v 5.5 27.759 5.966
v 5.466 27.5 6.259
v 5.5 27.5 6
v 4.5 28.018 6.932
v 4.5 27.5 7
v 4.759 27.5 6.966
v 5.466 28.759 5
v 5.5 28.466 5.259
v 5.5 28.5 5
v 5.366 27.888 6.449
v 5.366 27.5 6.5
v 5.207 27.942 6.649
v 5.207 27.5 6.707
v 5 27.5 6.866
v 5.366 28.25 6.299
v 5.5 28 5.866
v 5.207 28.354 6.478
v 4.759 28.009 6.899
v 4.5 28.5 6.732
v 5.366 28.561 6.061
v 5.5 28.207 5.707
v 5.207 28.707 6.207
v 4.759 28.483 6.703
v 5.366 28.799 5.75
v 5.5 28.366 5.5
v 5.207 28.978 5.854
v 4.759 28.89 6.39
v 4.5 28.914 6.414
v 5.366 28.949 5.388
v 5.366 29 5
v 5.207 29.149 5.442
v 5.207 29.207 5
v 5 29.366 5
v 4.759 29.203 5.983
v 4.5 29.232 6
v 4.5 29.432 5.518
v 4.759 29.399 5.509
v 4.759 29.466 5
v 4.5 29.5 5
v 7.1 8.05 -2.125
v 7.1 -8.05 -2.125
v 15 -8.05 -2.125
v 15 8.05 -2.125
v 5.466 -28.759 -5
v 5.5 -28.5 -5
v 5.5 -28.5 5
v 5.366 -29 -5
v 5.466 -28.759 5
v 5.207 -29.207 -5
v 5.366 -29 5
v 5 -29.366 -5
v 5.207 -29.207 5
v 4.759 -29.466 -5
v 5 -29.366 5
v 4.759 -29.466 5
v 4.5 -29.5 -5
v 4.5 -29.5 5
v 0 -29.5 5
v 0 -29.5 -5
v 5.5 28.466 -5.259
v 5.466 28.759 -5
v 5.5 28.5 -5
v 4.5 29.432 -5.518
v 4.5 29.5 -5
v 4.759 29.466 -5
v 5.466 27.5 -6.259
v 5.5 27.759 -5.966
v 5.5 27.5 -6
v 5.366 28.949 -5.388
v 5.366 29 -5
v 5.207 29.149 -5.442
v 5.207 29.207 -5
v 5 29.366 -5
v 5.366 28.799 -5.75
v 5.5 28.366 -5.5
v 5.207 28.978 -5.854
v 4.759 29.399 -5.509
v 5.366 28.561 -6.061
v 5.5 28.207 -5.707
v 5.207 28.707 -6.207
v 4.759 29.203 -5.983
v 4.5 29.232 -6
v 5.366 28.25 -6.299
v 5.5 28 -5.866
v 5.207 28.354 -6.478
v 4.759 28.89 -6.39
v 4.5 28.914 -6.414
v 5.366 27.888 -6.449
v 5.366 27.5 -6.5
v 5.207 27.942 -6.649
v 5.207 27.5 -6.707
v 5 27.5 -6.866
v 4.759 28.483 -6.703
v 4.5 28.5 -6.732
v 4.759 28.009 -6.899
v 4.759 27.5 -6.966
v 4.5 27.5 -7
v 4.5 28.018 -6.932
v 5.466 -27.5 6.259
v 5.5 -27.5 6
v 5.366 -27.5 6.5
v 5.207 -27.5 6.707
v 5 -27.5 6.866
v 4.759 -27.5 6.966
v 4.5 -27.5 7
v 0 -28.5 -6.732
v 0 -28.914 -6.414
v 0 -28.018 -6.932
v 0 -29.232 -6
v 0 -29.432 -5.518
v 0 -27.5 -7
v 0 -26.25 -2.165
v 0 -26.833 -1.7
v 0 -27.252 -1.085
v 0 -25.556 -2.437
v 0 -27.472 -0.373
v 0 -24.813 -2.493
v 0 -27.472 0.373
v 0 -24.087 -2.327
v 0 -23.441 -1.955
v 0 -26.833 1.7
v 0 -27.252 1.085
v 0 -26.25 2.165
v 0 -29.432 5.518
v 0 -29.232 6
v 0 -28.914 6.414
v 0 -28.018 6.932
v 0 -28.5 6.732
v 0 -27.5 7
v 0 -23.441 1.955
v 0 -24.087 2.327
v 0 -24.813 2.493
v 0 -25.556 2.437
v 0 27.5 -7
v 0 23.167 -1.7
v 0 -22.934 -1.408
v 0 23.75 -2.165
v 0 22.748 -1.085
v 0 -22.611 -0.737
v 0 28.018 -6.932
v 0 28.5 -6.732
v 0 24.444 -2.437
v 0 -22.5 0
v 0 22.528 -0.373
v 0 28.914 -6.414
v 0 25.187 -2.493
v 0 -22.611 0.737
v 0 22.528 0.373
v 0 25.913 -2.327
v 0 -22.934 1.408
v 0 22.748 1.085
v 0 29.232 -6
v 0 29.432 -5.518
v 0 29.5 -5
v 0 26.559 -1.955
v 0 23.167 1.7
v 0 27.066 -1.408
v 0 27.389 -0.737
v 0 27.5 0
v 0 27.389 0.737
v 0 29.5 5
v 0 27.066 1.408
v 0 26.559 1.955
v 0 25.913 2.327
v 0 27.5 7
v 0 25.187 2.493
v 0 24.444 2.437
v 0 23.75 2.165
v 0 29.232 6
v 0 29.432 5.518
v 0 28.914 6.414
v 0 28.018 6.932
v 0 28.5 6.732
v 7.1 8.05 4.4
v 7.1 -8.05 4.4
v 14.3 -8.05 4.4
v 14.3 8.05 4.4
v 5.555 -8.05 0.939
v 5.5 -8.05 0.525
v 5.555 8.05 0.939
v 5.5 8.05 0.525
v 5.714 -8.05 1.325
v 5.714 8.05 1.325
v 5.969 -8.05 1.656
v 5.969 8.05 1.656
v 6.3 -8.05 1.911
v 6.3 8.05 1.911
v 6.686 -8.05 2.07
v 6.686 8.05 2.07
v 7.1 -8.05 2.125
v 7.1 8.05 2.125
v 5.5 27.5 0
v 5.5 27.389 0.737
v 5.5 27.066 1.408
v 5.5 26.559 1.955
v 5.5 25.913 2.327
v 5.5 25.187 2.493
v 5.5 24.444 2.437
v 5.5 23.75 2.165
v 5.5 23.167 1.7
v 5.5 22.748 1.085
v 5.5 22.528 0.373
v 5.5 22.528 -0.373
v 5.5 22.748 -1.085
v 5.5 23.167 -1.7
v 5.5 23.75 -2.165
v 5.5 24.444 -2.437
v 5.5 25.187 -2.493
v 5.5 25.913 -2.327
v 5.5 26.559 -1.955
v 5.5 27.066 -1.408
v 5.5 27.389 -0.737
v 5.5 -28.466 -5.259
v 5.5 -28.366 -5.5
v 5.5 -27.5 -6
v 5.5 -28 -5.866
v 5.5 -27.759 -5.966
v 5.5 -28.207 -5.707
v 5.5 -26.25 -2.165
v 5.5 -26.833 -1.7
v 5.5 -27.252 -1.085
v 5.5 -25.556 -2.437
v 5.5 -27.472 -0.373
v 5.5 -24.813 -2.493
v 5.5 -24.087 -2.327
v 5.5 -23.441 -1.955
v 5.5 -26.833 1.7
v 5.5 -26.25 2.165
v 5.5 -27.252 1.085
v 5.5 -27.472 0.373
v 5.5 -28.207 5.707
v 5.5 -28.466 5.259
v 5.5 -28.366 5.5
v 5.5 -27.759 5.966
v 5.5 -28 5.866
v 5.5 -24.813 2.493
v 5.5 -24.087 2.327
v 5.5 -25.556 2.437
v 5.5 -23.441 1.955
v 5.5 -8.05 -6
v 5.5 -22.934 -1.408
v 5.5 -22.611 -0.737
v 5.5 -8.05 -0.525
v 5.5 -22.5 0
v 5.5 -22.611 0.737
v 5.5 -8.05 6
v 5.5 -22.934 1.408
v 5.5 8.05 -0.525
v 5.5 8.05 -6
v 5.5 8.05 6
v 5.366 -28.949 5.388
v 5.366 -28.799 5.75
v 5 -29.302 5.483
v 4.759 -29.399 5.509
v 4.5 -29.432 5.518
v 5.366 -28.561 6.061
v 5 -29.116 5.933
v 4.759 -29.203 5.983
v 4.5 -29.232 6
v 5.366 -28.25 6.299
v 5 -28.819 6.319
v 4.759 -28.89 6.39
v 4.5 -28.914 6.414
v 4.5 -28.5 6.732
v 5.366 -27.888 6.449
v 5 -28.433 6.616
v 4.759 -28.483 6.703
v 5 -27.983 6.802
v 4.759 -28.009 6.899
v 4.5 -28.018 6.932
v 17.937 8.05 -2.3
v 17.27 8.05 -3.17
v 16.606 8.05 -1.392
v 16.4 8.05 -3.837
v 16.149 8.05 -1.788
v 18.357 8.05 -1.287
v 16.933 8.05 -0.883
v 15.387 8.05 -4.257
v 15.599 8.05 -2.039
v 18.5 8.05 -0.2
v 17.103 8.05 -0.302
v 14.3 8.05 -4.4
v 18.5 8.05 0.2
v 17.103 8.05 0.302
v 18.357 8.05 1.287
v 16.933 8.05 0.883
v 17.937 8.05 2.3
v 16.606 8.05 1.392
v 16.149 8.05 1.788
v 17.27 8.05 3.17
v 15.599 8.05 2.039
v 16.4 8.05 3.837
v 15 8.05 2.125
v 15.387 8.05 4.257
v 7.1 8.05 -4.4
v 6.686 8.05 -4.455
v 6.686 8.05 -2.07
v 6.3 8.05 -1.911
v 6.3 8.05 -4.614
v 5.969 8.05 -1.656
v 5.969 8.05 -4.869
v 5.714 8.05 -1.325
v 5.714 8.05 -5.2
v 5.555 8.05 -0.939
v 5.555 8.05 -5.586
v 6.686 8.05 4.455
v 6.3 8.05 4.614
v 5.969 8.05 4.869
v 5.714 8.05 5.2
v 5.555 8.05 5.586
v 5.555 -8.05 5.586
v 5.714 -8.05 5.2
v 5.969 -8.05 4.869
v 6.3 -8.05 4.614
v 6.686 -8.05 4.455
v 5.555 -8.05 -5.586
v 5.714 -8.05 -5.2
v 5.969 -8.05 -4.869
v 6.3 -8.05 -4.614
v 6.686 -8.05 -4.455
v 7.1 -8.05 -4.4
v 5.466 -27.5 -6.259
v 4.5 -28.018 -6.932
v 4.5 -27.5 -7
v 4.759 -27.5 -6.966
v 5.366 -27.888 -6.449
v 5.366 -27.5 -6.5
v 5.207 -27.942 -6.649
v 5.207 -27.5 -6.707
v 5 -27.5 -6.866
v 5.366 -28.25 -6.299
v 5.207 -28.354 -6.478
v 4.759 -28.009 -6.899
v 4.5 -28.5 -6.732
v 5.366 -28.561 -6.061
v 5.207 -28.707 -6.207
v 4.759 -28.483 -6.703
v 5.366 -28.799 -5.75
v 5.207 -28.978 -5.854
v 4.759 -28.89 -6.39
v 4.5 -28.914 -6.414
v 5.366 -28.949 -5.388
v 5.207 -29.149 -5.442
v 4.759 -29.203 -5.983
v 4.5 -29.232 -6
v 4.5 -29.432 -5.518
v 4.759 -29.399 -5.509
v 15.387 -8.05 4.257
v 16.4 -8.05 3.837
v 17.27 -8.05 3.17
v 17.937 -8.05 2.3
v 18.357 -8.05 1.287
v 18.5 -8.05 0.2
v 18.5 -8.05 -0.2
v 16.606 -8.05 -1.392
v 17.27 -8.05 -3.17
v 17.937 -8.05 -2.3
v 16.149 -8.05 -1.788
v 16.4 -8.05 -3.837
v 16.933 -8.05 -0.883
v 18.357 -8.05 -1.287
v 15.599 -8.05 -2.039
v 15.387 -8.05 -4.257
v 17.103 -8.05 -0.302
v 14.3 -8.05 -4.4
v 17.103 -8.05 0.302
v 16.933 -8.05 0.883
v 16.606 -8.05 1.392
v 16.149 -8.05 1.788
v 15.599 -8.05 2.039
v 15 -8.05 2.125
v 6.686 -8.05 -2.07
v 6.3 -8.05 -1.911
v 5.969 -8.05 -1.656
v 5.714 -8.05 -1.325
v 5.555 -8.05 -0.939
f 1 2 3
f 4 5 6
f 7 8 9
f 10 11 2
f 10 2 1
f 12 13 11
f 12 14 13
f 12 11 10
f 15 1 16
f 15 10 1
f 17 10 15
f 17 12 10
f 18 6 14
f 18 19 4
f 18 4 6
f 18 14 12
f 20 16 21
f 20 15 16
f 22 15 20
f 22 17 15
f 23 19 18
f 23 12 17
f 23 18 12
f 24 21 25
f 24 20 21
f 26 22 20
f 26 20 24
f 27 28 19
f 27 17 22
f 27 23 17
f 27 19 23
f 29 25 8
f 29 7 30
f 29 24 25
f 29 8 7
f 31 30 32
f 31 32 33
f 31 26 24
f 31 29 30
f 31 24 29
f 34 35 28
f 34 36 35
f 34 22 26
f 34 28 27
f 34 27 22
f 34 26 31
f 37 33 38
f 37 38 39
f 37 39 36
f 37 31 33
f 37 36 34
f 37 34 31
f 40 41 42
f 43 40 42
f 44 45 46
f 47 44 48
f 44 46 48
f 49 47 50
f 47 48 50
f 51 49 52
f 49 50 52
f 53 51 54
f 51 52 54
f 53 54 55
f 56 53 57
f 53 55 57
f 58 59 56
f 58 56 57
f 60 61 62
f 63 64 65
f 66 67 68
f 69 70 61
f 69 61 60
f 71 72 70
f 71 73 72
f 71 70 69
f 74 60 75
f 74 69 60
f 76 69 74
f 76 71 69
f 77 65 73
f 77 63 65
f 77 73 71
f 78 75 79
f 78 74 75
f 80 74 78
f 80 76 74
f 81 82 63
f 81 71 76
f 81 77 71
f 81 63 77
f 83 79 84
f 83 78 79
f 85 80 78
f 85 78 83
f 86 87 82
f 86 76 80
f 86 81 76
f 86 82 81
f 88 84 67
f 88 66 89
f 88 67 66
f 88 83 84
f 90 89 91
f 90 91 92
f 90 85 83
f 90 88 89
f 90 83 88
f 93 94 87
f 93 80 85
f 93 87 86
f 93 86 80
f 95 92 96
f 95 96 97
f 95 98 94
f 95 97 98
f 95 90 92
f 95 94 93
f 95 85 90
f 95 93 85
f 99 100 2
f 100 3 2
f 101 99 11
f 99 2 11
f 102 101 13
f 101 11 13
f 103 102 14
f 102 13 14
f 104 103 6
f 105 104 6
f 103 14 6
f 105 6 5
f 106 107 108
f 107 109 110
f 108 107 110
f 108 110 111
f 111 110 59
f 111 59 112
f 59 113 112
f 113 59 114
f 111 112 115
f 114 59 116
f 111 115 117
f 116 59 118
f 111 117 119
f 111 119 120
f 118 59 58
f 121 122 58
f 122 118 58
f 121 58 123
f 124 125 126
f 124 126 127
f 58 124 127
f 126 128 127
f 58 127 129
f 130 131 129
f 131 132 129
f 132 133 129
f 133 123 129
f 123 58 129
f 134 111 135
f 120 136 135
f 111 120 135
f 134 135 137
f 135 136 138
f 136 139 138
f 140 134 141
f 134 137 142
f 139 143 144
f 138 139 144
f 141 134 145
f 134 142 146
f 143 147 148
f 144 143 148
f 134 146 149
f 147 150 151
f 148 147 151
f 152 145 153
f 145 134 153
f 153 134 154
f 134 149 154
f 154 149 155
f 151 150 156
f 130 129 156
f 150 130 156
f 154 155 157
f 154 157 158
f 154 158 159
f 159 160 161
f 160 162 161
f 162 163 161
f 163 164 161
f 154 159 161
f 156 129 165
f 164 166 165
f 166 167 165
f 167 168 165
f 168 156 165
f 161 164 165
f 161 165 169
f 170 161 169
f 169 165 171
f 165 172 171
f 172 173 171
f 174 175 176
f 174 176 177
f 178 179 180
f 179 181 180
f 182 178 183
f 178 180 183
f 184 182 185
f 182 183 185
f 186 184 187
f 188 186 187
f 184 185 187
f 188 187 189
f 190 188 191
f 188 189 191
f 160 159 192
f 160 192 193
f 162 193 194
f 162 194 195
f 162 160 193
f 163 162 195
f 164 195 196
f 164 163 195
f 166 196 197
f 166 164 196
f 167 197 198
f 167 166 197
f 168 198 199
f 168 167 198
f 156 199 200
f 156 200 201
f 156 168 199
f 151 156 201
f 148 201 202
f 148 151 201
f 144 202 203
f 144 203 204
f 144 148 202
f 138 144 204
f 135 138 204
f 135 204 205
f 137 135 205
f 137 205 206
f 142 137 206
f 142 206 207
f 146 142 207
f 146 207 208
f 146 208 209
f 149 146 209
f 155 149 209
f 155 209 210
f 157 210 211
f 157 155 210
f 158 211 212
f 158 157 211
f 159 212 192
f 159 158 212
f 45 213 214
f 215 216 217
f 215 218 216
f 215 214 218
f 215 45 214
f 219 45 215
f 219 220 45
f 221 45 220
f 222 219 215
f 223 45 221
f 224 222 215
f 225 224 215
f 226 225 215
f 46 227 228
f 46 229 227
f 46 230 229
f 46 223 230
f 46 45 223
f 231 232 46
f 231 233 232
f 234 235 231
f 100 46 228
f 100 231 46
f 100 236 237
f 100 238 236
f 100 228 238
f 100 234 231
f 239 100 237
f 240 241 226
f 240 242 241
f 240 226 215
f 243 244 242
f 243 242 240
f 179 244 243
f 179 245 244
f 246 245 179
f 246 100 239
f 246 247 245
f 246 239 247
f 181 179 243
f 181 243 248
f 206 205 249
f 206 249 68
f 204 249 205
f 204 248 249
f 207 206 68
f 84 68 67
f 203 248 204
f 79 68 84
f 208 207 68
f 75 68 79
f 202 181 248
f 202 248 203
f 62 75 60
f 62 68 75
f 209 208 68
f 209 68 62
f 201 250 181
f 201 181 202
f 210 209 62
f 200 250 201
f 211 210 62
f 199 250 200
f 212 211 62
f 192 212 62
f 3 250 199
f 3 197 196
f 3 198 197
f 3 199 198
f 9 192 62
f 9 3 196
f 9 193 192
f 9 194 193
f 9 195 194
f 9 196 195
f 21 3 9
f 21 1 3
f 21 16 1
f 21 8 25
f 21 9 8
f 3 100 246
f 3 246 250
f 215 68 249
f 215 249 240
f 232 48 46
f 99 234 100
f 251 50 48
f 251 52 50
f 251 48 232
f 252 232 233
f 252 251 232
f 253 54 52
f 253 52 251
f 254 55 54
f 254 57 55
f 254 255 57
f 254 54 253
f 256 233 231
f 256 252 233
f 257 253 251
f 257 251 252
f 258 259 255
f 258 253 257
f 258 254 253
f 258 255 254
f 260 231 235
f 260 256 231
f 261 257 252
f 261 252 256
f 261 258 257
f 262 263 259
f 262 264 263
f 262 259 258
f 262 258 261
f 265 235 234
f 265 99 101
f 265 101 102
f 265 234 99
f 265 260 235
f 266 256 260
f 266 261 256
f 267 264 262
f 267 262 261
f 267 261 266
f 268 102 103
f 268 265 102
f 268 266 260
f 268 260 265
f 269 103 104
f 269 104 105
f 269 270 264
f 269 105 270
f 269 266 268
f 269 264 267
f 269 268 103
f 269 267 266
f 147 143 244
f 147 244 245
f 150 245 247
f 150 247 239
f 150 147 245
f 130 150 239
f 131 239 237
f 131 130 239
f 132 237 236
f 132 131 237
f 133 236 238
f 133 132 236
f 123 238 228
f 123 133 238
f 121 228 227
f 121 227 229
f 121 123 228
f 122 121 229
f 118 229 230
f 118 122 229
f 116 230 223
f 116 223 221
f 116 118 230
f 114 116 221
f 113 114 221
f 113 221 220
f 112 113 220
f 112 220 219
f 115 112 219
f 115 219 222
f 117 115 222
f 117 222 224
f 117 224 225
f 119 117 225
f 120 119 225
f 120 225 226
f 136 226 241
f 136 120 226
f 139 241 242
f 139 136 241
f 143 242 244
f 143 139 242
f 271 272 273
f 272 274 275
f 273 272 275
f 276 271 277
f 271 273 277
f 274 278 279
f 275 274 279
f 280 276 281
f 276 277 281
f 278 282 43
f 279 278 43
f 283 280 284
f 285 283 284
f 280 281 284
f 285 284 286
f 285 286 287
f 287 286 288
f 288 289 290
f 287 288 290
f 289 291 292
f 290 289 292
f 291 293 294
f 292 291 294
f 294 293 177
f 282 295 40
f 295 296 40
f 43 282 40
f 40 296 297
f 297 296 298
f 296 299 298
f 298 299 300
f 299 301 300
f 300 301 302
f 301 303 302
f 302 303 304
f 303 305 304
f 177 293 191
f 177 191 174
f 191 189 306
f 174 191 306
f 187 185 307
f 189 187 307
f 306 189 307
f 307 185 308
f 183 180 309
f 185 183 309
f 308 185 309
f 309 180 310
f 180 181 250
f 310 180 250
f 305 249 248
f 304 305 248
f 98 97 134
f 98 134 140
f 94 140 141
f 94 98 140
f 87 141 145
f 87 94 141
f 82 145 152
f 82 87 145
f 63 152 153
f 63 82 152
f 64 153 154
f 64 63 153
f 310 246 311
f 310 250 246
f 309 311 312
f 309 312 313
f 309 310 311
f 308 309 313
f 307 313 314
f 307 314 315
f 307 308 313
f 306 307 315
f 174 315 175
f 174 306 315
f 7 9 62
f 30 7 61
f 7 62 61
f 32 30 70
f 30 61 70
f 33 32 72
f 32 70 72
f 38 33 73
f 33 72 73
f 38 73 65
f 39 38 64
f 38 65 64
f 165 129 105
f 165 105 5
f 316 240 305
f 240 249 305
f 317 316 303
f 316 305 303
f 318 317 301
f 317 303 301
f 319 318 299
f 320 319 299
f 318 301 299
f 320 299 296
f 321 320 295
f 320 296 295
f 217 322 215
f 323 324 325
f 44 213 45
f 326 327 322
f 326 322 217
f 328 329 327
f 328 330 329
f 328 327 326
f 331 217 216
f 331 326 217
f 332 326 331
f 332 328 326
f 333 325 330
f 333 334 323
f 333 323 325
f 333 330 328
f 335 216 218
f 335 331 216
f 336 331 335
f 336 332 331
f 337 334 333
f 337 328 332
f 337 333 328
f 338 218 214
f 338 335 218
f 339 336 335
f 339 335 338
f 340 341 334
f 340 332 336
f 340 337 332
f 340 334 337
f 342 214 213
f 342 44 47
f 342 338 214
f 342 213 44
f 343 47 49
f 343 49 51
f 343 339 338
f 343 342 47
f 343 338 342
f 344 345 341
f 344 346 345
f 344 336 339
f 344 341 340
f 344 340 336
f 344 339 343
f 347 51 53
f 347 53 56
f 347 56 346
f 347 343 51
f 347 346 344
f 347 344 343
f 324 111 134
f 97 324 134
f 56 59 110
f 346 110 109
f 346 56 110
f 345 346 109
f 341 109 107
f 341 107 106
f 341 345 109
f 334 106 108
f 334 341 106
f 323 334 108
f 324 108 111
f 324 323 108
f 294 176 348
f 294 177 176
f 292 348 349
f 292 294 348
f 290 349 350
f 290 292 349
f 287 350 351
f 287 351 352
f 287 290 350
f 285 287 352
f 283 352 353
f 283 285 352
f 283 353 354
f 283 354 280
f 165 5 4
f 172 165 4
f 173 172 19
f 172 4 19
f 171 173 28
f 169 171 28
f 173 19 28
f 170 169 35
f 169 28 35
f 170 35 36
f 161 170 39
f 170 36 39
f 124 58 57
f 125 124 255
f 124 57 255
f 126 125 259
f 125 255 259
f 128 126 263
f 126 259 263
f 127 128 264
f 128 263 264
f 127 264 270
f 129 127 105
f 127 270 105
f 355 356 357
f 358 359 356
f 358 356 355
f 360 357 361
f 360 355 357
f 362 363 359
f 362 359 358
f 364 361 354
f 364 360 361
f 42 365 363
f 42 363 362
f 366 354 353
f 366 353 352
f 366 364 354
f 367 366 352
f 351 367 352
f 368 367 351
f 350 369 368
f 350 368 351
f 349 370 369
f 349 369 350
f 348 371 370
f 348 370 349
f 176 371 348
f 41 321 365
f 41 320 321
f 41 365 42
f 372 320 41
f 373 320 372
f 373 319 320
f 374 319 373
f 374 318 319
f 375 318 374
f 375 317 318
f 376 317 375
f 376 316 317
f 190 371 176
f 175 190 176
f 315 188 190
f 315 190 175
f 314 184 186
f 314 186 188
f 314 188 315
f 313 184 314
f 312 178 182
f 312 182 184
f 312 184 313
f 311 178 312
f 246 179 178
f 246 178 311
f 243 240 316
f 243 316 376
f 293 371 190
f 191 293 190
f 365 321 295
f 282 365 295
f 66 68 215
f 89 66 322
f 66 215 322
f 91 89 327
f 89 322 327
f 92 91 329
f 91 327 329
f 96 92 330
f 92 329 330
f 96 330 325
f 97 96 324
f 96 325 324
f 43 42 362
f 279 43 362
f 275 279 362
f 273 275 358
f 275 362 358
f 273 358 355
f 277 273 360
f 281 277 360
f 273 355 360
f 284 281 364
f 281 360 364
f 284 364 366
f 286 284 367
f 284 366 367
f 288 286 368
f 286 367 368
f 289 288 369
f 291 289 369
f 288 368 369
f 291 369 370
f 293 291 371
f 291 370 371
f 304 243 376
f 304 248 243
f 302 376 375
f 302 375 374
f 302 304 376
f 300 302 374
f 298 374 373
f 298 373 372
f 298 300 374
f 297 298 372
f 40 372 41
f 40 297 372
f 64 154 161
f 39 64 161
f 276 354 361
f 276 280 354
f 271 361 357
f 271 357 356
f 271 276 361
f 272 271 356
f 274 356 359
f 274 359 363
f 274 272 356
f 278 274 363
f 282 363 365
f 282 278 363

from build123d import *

# Parameters (mm, degrees)
F0_W     = 59
F0_H     = 14
F0_R     = 2.5
F0_W_2   = 16.1
F0_H_2   = 8.8
F1_DEPTH = 5.5
F2_DEPTH = 18.5
F3_R     = 4.2
F4_R     = 2
F5_R     = 1
F7_DEPTH = 25
F8_R     = 1.59999


# Not quite as in the source:
# - a fillet or chamfer is up to 0.001 mm smaller than in the source, because OpenCascade refuses the exact size


with BuildPart() as f1:
    # F0 (on Right) → F1 (new body)
    with BuildSketch(Plane.YZ):
        Rectangle(F0_W, F0_H)
        with Locations((-25, 0)):
            Circle(F0_R, mode=Mode.SUBTRACT)
        Rectangle(F0_W_2, F0_H_2, mode=Mode.SUBTRACT)
        with Locations((25, 0)):
            Circle(F0_R, mode=Mode.SUBTRACT)
    extrude(amount=F1_DEPTH)

    # F0 (on Right) → F2 (join)
    with BuildSketch(Plane.YZ):
        Rectangle(F0_W_2, F0_H_2)
        Circle(F0_R, mode=Mode.SUBTRACT)
        Circle(F0_R)
    extrude(amount=F2_DEPTH)

    # F3
    f3_edges = [f1.edges().sort_by_distance(p)[0] for p in [
        (18.5, 0, 4.4),
        (18.5, 0, -4.4),
    ]]
    fillet(f3_edges, radius=F3_R)

    # F4
    f4_edges = [f1.edges().sort_by_distance(p)[0] for p in [
        (2.75, 29.5, 7),
        (2.75, 29.5, -7),
        (2.75, -29.5, 7),
        (2.75, -29.5, -7),
    ]]
    fillet(f4_edges, radius=F4_R)

    # F5
    f5_edges = [f1.edges().sort_by_distance(p)[0] for p in [
        (5.5, 0, 7),
    ]]
    fillet(f5_edges, radius=F5_R)

    # F6 (on face) → F7 (cut)
    with BuildSketch(Plane.XZ.offset(8.05)):
        with BuildLine():
            Line((5.5, 2.125), (5.5, -2.125))
            Line((5.5, -2.125), (15, -2.125))
            ThreePointArc((15, -2.125), (17.125, 0), (15, 2.125))
            Line((15, 2.125), (5.5, 2.125))
        make_face()
    extrude(amount=-F7_DEPTH, mode=Mode.SUBTRACT)

    # F8 (radius 1.6 in the source; OpenCascade refuses exactly that, so slightly less here)
    f8_edges = [f1.edges().sort_by_distance(p)[0] for p in [
        (5.5, 0, 4.4),
        (5.5, 0, -4.4),
        (5.5, 0, -2.125),
        (5.5, 0, 2.125),
    ]]
    fillet(f8_edges, radius=F8_R)


solid = f1.part
